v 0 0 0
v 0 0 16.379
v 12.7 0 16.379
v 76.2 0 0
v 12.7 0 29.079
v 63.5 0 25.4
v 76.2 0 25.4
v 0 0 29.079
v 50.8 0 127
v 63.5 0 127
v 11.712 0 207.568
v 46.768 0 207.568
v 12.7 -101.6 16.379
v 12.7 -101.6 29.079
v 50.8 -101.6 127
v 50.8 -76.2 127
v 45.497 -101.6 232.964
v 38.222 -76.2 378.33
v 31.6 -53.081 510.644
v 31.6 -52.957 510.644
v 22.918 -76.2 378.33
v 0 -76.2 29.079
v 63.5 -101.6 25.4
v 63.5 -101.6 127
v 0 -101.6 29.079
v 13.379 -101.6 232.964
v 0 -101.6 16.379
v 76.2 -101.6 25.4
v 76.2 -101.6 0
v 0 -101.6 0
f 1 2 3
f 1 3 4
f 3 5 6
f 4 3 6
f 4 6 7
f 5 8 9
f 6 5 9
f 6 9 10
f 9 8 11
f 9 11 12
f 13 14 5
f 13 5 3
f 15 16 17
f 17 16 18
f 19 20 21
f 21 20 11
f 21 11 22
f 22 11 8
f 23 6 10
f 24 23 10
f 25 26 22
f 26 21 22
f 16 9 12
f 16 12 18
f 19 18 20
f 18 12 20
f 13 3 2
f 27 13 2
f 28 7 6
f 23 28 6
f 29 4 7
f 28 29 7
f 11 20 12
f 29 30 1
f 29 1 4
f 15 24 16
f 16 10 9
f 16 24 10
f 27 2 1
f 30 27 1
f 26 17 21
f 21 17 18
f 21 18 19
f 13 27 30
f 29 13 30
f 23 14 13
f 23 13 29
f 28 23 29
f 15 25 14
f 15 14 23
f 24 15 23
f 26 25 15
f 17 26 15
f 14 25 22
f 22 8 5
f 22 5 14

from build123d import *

# Parameters (mm, degrees)
F1_DEPTH = 76.2
F2_DEPTH = 25.4
F4_DEPTH = 127


with BuildPart() as f1:
    # F0 (on Front) → F1 (new body)
    with BuildSketch(Plane.XZ):
        Polygon((0, 16.379364), (0, 0), (76.2, 0), (76.2, 25.4), (63.5, 25.4), (63.5, 127), (50.8, 127), (31.600004, 510.643689), (0, 29.079364), (12.7, 29.079364), (12.7, 16.379364), align=None)
    extrude(amount=F1_DEPTH)

    # F0 (on Front) + F1_face (on face) → F2 (join)
    with BuildSketch(Plane.XZ):
        Polygon((0, 16.379364), (0, 0), (76.2, 0), (76.2, 25.4), (63.5, 25.4), (63.5, 127), (50.8, 127), (31.600004, 510.643689), (0, 29.079364), (12.7, 29.079364), (12.7, 16.379364), align=None)
    with BuildSketch(Plane(origin=(32.20504, -76.2, 161.502692), x_dir=(1, 0, 0), z_dir=(0, -1, 0))):
        Polygon((-32.20504, -132.423328), (-19.50504, -132.423328), (-19.50504, -145.123328), (-32.20504, -145.123328), (-32.20504, -161.502692), (43.99496, -161.502692), (43.99496, -136.102692), (31.29496, -136.102692), (31.29496, -34.502692), (18.59496, -34.502692), (-0.605036, 349.140998), align=None)
    extrude(amount=F2_DEPTH)

    # F3 (on Right) → F4 (cut, symmetric)
    with BuildSketch(Plane.YZ):
        Polygon((-53.018704, 510.999203), (36.268413, 0), (28.625131, 603.81484), (-150.899715, 678.91259), (-142.305821, 0), align=None)
    extrude(amount=F4_DEPTH, both=True, mode=Mode.SUBTRACT)


solid = f1.part
